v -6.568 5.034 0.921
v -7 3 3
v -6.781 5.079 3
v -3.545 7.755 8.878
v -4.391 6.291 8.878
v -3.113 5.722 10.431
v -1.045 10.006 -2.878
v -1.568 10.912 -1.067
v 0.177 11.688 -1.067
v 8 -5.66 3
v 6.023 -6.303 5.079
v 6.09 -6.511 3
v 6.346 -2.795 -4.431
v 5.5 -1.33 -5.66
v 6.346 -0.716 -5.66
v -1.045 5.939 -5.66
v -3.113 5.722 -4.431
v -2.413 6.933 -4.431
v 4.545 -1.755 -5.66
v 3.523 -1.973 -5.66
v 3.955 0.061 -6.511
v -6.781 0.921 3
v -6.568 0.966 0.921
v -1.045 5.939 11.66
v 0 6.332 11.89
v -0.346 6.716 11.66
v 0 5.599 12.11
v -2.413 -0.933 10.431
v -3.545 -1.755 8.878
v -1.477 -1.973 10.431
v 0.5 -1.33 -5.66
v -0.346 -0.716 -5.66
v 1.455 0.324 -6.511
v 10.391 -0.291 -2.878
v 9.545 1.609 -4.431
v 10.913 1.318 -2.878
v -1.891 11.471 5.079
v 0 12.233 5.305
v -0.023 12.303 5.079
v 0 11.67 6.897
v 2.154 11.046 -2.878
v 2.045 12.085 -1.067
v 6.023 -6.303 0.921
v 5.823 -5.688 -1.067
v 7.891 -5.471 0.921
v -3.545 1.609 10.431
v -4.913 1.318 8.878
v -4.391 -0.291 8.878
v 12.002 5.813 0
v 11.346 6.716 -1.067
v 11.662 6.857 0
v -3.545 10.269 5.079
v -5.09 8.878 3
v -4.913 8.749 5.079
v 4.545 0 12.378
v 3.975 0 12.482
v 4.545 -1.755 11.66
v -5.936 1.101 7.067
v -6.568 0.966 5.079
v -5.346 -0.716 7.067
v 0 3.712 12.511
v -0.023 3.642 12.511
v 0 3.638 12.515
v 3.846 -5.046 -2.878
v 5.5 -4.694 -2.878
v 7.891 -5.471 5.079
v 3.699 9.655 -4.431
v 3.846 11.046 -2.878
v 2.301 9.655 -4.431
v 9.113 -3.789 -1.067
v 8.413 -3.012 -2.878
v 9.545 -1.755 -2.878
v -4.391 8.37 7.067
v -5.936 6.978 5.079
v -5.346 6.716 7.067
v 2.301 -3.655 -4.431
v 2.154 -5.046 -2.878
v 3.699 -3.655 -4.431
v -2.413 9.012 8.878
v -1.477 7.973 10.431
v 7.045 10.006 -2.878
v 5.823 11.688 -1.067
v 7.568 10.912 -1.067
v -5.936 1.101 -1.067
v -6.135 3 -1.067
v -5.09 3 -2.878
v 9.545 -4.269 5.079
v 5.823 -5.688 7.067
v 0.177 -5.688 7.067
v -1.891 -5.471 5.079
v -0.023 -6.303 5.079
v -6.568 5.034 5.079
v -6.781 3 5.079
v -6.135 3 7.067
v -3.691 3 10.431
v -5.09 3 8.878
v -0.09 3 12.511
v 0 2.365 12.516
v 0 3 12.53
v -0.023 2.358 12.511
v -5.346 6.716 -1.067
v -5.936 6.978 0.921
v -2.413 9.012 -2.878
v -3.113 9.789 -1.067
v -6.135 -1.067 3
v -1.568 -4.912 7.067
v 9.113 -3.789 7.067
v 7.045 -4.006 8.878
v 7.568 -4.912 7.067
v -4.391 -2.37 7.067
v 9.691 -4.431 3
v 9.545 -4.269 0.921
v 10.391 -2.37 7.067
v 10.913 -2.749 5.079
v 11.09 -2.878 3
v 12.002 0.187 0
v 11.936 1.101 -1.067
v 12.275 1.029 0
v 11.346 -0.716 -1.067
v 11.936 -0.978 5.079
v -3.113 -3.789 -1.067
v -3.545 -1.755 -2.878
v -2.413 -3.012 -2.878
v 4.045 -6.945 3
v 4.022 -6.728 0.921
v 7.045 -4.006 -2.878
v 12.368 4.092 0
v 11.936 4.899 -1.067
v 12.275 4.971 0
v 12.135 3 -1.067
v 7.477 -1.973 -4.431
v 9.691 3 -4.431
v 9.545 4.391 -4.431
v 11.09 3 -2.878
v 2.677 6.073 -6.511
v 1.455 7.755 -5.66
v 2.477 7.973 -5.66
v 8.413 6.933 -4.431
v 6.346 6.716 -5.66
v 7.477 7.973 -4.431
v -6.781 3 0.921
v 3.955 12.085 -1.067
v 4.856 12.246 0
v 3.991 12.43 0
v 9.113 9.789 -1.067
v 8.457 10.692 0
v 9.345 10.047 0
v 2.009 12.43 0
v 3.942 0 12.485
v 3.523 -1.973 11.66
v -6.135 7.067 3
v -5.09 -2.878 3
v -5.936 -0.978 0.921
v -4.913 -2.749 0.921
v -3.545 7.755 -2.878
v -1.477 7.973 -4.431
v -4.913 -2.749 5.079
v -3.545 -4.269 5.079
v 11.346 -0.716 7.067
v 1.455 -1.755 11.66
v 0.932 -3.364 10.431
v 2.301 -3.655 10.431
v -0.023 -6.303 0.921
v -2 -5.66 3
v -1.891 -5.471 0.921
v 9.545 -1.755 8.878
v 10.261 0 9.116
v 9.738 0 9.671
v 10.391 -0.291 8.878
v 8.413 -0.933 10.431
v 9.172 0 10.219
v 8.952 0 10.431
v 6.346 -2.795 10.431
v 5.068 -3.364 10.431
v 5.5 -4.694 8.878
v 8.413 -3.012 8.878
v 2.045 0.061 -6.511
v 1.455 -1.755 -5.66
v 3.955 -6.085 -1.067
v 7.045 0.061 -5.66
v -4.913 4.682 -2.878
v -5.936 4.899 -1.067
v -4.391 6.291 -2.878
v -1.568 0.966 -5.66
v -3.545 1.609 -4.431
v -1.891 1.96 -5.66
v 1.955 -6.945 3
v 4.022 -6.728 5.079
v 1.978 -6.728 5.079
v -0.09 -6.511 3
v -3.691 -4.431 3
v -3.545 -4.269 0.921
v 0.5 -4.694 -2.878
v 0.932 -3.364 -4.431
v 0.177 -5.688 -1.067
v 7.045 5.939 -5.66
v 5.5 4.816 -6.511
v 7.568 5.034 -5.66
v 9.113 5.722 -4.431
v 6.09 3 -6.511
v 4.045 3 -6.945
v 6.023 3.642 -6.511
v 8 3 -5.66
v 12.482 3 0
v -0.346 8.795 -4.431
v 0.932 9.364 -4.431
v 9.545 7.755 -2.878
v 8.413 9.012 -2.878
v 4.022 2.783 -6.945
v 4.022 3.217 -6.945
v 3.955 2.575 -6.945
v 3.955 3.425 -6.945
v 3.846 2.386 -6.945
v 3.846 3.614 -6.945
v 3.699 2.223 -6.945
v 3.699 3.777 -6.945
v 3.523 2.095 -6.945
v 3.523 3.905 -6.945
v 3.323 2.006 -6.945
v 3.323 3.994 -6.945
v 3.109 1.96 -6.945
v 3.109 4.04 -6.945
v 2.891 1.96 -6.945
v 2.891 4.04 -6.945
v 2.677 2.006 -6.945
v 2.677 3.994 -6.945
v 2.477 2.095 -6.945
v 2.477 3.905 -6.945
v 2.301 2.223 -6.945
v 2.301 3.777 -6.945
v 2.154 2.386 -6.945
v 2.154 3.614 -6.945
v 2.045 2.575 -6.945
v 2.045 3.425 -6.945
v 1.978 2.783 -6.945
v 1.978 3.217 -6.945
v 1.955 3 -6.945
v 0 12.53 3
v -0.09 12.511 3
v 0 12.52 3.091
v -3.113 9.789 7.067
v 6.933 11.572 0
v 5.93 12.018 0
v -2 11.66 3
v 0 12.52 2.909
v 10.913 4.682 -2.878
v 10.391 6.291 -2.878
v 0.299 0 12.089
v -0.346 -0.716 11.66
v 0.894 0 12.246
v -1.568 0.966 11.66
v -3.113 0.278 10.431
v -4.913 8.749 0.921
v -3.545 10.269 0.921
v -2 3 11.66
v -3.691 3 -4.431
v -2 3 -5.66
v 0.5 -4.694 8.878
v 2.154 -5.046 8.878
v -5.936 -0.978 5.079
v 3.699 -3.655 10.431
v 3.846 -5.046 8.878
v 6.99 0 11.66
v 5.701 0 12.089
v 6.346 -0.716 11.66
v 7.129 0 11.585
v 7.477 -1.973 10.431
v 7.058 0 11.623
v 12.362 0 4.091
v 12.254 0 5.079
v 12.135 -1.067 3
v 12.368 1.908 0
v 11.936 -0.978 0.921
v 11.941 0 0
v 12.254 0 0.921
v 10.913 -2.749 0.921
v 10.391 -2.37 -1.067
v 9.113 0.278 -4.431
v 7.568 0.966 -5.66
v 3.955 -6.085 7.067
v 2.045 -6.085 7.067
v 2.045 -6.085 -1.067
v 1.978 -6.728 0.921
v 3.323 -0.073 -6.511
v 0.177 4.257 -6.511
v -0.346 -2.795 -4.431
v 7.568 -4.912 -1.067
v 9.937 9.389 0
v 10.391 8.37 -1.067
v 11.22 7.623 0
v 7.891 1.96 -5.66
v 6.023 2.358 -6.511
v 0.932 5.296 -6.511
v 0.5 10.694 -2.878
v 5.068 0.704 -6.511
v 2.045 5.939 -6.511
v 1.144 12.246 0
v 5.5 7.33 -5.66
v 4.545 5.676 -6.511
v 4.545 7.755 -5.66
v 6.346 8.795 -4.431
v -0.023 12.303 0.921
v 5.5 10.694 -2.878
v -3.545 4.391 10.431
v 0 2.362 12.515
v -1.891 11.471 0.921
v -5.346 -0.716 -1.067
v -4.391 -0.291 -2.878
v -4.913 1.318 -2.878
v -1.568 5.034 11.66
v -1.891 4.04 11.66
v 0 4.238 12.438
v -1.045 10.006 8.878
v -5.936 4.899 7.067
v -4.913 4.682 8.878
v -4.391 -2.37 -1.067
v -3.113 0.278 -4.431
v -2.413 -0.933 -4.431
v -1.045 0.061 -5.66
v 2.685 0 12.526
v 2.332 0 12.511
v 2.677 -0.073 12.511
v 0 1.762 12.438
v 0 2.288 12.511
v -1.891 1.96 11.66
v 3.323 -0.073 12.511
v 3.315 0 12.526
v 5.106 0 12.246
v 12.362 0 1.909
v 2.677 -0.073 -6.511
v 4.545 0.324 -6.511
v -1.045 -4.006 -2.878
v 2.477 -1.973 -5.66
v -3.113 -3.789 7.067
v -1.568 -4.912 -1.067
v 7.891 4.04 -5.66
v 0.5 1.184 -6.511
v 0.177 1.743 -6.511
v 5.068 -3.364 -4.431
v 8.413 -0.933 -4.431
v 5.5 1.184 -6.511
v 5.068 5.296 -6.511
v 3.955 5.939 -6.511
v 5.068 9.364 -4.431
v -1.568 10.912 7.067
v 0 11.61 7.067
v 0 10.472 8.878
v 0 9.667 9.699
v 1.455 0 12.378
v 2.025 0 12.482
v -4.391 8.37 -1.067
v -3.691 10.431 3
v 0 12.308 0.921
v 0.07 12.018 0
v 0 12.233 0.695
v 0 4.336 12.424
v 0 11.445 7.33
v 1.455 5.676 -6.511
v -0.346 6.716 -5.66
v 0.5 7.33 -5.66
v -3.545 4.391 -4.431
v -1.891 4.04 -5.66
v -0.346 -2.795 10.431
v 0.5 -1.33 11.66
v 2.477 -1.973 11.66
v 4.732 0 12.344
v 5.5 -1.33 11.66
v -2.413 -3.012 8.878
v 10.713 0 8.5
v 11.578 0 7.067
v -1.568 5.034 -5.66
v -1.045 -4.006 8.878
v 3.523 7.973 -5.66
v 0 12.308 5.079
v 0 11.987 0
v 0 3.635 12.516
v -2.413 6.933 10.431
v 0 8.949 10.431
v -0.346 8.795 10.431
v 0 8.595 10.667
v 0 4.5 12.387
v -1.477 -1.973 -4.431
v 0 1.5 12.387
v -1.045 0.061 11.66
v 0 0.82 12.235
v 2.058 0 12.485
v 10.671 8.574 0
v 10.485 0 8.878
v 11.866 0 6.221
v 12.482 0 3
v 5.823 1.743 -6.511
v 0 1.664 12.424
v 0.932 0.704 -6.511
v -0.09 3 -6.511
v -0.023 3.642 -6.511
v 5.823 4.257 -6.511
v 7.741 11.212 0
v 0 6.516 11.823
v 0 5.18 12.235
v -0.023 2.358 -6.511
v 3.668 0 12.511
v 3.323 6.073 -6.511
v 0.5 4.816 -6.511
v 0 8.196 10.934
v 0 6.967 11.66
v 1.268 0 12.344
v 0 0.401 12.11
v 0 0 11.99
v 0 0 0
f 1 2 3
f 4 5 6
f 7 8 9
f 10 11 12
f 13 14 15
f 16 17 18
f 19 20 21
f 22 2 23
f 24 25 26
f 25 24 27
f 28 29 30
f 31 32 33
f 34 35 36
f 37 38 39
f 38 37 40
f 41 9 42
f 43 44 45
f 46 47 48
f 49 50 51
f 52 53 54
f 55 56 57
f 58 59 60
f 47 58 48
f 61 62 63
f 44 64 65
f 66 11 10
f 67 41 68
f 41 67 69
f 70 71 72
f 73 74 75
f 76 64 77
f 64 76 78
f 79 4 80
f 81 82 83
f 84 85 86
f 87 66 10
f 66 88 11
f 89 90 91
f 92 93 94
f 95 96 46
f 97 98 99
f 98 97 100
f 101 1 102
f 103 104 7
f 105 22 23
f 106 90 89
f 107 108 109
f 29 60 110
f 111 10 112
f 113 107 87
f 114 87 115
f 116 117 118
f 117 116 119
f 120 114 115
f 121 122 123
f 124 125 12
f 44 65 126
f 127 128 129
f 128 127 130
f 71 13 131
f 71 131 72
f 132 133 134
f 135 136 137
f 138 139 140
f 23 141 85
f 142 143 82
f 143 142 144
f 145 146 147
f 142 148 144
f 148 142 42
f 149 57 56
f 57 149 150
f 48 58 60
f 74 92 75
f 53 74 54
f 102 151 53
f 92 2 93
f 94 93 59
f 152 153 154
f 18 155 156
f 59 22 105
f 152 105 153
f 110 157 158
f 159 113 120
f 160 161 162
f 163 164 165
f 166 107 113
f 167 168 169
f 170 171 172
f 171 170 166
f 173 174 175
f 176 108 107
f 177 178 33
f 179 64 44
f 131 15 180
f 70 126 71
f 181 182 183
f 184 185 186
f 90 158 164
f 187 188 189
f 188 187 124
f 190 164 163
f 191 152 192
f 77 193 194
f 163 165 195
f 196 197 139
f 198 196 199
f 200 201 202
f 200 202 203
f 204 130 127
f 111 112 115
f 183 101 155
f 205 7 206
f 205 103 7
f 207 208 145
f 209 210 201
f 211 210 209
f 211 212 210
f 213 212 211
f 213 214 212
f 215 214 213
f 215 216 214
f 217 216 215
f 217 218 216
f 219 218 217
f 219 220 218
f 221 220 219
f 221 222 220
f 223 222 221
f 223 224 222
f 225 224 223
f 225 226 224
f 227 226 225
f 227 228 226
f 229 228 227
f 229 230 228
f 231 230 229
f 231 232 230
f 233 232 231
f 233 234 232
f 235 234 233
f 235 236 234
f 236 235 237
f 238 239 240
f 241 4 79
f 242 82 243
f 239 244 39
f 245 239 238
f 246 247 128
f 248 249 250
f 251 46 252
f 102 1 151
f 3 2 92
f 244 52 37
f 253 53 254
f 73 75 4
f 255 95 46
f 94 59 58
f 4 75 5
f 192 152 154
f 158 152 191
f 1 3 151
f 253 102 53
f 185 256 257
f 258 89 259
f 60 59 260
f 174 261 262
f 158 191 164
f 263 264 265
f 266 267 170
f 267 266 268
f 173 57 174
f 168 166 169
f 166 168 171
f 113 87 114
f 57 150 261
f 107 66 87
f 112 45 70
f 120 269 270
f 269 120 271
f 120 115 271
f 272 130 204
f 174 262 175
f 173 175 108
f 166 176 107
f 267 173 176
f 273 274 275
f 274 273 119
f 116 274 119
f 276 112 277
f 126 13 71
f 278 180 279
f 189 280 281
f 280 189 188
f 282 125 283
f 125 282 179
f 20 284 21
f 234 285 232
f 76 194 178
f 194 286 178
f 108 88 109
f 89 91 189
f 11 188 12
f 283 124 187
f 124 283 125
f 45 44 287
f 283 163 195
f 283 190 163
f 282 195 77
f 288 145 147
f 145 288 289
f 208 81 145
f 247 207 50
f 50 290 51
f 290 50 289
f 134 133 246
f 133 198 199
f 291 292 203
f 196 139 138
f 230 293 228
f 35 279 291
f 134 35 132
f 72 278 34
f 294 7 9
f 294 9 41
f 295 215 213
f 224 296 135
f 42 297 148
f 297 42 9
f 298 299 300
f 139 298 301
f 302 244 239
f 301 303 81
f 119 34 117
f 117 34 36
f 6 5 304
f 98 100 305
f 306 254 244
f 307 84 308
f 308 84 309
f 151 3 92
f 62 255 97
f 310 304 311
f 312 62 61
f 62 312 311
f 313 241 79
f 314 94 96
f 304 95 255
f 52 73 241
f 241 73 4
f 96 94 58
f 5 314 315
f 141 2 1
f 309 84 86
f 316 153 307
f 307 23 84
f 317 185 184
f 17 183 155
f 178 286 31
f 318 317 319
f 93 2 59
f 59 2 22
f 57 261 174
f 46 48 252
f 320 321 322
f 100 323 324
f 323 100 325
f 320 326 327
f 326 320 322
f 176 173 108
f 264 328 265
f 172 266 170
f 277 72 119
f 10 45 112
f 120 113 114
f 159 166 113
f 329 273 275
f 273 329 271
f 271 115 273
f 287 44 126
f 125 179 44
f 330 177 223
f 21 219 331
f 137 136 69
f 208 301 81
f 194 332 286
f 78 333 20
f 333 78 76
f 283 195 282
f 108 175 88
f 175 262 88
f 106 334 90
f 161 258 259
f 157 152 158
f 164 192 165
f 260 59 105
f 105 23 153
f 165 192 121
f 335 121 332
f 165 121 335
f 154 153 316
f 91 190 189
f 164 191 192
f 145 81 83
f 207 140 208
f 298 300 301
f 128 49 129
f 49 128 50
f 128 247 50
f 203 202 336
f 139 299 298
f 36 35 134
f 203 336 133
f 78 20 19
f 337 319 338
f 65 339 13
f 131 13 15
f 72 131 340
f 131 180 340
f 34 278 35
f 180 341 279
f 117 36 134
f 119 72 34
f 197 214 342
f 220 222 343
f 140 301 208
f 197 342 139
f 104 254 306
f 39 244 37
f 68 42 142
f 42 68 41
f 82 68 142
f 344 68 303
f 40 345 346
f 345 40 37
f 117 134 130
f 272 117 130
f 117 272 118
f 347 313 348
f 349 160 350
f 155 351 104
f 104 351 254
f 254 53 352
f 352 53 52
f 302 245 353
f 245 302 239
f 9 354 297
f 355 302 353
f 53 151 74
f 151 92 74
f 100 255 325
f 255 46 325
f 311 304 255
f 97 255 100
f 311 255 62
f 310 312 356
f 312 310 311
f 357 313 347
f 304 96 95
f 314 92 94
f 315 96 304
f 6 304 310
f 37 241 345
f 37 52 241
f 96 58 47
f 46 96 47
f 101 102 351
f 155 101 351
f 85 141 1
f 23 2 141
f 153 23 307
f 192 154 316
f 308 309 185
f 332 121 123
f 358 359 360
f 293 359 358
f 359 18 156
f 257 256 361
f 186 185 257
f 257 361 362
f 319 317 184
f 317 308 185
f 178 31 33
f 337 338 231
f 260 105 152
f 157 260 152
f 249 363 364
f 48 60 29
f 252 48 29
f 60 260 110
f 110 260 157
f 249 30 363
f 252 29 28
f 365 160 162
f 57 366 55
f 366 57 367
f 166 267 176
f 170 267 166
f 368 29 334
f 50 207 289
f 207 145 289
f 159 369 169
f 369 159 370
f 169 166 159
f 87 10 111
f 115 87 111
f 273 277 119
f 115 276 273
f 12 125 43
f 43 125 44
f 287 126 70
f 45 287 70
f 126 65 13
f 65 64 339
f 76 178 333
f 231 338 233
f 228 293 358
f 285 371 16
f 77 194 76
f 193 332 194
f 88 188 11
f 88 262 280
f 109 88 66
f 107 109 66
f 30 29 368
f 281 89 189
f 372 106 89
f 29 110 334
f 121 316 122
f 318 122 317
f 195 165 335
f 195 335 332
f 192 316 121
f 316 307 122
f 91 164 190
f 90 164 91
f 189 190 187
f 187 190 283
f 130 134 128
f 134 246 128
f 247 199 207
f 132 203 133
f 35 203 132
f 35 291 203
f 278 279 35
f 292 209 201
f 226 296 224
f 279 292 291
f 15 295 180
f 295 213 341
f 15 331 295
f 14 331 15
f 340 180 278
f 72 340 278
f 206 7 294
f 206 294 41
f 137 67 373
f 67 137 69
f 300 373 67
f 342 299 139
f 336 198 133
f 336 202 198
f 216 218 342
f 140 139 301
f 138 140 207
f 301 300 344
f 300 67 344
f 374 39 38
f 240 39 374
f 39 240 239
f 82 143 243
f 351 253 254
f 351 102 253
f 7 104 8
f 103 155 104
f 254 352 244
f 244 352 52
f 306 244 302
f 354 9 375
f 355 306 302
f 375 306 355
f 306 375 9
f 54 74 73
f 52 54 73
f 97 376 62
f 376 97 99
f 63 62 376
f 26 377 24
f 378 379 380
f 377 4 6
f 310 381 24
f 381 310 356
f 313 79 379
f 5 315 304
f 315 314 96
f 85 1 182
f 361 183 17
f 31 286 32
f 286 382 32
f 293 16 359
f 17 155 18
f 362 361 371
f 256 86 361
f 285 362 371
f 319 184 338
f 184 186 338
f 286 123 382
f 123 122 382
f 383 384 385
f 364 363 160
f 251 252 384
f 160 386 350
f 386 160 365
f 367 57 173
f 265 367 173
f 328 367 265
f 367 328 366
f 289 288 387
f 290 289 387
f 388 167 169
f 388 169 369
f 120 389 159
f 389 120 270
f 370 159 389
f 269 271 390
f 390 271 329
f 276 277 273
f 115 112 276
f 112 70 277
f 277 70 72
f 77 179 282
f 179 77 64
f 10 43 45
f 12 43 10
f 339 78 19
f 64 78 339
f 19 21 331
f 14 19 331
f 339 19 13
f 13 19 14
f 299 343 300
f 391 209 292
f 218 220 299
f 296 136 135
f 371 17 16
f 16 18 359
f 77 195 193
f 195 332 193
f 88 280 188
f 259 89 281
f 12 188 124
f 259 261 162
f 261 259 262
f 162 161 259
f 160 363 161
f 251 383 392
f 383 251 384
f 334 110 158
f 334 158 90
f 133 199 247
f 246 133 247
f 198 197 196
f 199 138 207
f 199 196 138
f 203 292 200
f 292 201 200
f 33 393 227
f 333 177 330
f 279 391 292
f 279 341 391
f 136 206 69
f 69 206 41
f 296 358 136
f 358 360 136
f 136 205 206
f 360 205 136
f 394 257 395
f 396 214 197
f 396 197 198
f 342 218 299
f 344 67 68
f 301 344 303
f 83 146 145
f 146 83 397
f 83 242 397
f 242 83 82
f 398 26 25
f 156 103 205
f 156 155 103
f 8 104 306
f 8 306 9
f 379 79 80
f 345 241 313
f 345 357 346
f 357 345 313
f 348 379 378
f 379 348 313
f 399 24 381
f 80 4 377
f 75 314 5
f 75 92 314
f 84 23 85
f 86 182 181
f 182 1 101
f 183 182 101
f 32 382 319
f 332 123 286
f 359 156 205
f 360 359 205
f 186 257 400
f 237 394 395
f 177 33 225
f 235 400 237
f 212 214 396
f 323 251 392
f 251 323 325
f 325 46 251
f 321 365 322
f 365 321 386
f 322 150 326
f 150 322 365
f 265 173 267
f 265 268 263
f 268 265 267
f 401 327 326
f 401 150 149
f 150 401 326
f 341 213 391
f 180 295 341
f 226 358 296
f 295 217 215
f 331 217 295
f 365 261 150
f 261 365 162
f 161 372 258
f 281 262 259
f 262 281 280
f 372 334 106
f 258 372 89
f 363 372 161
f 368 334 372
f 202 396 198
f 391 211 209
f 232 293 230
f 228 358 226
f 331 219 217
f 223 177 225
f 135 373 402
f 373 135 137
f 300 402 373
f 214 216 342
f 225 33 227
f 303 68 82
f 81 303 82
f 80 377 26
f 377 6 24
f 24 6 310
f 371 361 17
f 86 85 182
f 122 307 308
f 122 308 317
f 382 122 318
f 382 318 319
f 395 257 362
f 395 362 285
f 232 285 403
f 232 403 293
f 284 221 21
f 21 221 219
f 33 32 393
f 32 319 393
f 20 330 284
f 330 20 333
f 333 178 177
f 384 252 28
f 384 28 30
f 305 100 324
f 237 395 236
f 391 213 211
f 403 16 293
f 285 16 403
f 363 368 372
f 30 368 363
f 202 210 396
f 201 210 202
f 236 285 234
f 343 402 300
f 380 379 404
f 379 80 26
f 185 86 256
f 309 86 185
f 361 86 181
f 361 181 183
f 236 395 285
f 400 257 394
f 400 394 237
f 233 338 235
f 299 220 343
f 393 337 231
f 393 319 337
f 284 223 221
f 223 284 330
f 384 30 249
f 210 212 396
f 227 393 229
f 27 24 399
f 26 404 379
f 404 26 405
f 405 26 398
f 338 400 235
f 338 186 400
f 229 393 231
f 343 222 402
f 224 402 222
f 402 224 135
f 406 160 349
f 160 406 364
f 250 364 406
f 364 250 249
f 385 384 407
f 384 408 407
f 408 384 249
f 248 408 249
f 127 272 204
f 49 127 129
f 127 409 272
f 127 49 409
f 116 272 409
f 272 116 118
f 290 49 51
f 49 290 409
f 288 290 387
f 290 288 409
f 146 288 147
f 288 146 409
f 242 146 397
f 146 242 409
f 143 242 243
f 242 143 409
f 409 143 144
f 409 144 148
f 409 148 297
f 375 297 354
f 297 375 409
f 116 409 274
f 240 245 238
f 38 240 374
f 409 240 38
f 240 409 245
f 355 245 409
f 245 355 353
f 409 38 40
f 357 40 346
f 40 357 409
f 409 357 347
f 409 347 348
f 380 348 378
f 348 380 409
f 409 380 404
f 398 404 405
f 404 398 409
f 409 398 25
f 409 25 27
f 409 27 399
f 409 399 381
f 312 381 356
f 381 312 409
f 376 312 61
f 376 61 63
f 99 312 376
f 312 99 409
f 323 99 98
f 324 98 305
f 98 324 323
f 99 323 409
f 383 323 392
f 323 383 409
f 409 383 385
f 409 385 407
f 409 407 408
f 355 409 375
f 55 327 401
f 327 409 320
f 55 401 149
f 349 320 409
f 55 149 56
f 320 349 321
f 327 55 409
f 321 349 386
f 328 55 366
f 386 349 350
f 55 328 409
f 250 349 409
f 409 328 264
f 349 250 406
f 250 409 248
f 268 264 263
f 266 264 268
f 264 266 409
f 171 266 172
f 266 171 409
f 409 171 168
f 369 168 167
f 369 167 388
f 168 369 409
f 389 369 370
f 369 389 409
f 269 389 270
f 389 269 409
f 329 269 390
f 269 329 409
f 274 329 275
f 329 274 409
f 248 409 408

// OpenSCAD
difference() {
	translate([3, 3, 3]) {
		sphere(r=10);
	}
	cube(size=15);
}
